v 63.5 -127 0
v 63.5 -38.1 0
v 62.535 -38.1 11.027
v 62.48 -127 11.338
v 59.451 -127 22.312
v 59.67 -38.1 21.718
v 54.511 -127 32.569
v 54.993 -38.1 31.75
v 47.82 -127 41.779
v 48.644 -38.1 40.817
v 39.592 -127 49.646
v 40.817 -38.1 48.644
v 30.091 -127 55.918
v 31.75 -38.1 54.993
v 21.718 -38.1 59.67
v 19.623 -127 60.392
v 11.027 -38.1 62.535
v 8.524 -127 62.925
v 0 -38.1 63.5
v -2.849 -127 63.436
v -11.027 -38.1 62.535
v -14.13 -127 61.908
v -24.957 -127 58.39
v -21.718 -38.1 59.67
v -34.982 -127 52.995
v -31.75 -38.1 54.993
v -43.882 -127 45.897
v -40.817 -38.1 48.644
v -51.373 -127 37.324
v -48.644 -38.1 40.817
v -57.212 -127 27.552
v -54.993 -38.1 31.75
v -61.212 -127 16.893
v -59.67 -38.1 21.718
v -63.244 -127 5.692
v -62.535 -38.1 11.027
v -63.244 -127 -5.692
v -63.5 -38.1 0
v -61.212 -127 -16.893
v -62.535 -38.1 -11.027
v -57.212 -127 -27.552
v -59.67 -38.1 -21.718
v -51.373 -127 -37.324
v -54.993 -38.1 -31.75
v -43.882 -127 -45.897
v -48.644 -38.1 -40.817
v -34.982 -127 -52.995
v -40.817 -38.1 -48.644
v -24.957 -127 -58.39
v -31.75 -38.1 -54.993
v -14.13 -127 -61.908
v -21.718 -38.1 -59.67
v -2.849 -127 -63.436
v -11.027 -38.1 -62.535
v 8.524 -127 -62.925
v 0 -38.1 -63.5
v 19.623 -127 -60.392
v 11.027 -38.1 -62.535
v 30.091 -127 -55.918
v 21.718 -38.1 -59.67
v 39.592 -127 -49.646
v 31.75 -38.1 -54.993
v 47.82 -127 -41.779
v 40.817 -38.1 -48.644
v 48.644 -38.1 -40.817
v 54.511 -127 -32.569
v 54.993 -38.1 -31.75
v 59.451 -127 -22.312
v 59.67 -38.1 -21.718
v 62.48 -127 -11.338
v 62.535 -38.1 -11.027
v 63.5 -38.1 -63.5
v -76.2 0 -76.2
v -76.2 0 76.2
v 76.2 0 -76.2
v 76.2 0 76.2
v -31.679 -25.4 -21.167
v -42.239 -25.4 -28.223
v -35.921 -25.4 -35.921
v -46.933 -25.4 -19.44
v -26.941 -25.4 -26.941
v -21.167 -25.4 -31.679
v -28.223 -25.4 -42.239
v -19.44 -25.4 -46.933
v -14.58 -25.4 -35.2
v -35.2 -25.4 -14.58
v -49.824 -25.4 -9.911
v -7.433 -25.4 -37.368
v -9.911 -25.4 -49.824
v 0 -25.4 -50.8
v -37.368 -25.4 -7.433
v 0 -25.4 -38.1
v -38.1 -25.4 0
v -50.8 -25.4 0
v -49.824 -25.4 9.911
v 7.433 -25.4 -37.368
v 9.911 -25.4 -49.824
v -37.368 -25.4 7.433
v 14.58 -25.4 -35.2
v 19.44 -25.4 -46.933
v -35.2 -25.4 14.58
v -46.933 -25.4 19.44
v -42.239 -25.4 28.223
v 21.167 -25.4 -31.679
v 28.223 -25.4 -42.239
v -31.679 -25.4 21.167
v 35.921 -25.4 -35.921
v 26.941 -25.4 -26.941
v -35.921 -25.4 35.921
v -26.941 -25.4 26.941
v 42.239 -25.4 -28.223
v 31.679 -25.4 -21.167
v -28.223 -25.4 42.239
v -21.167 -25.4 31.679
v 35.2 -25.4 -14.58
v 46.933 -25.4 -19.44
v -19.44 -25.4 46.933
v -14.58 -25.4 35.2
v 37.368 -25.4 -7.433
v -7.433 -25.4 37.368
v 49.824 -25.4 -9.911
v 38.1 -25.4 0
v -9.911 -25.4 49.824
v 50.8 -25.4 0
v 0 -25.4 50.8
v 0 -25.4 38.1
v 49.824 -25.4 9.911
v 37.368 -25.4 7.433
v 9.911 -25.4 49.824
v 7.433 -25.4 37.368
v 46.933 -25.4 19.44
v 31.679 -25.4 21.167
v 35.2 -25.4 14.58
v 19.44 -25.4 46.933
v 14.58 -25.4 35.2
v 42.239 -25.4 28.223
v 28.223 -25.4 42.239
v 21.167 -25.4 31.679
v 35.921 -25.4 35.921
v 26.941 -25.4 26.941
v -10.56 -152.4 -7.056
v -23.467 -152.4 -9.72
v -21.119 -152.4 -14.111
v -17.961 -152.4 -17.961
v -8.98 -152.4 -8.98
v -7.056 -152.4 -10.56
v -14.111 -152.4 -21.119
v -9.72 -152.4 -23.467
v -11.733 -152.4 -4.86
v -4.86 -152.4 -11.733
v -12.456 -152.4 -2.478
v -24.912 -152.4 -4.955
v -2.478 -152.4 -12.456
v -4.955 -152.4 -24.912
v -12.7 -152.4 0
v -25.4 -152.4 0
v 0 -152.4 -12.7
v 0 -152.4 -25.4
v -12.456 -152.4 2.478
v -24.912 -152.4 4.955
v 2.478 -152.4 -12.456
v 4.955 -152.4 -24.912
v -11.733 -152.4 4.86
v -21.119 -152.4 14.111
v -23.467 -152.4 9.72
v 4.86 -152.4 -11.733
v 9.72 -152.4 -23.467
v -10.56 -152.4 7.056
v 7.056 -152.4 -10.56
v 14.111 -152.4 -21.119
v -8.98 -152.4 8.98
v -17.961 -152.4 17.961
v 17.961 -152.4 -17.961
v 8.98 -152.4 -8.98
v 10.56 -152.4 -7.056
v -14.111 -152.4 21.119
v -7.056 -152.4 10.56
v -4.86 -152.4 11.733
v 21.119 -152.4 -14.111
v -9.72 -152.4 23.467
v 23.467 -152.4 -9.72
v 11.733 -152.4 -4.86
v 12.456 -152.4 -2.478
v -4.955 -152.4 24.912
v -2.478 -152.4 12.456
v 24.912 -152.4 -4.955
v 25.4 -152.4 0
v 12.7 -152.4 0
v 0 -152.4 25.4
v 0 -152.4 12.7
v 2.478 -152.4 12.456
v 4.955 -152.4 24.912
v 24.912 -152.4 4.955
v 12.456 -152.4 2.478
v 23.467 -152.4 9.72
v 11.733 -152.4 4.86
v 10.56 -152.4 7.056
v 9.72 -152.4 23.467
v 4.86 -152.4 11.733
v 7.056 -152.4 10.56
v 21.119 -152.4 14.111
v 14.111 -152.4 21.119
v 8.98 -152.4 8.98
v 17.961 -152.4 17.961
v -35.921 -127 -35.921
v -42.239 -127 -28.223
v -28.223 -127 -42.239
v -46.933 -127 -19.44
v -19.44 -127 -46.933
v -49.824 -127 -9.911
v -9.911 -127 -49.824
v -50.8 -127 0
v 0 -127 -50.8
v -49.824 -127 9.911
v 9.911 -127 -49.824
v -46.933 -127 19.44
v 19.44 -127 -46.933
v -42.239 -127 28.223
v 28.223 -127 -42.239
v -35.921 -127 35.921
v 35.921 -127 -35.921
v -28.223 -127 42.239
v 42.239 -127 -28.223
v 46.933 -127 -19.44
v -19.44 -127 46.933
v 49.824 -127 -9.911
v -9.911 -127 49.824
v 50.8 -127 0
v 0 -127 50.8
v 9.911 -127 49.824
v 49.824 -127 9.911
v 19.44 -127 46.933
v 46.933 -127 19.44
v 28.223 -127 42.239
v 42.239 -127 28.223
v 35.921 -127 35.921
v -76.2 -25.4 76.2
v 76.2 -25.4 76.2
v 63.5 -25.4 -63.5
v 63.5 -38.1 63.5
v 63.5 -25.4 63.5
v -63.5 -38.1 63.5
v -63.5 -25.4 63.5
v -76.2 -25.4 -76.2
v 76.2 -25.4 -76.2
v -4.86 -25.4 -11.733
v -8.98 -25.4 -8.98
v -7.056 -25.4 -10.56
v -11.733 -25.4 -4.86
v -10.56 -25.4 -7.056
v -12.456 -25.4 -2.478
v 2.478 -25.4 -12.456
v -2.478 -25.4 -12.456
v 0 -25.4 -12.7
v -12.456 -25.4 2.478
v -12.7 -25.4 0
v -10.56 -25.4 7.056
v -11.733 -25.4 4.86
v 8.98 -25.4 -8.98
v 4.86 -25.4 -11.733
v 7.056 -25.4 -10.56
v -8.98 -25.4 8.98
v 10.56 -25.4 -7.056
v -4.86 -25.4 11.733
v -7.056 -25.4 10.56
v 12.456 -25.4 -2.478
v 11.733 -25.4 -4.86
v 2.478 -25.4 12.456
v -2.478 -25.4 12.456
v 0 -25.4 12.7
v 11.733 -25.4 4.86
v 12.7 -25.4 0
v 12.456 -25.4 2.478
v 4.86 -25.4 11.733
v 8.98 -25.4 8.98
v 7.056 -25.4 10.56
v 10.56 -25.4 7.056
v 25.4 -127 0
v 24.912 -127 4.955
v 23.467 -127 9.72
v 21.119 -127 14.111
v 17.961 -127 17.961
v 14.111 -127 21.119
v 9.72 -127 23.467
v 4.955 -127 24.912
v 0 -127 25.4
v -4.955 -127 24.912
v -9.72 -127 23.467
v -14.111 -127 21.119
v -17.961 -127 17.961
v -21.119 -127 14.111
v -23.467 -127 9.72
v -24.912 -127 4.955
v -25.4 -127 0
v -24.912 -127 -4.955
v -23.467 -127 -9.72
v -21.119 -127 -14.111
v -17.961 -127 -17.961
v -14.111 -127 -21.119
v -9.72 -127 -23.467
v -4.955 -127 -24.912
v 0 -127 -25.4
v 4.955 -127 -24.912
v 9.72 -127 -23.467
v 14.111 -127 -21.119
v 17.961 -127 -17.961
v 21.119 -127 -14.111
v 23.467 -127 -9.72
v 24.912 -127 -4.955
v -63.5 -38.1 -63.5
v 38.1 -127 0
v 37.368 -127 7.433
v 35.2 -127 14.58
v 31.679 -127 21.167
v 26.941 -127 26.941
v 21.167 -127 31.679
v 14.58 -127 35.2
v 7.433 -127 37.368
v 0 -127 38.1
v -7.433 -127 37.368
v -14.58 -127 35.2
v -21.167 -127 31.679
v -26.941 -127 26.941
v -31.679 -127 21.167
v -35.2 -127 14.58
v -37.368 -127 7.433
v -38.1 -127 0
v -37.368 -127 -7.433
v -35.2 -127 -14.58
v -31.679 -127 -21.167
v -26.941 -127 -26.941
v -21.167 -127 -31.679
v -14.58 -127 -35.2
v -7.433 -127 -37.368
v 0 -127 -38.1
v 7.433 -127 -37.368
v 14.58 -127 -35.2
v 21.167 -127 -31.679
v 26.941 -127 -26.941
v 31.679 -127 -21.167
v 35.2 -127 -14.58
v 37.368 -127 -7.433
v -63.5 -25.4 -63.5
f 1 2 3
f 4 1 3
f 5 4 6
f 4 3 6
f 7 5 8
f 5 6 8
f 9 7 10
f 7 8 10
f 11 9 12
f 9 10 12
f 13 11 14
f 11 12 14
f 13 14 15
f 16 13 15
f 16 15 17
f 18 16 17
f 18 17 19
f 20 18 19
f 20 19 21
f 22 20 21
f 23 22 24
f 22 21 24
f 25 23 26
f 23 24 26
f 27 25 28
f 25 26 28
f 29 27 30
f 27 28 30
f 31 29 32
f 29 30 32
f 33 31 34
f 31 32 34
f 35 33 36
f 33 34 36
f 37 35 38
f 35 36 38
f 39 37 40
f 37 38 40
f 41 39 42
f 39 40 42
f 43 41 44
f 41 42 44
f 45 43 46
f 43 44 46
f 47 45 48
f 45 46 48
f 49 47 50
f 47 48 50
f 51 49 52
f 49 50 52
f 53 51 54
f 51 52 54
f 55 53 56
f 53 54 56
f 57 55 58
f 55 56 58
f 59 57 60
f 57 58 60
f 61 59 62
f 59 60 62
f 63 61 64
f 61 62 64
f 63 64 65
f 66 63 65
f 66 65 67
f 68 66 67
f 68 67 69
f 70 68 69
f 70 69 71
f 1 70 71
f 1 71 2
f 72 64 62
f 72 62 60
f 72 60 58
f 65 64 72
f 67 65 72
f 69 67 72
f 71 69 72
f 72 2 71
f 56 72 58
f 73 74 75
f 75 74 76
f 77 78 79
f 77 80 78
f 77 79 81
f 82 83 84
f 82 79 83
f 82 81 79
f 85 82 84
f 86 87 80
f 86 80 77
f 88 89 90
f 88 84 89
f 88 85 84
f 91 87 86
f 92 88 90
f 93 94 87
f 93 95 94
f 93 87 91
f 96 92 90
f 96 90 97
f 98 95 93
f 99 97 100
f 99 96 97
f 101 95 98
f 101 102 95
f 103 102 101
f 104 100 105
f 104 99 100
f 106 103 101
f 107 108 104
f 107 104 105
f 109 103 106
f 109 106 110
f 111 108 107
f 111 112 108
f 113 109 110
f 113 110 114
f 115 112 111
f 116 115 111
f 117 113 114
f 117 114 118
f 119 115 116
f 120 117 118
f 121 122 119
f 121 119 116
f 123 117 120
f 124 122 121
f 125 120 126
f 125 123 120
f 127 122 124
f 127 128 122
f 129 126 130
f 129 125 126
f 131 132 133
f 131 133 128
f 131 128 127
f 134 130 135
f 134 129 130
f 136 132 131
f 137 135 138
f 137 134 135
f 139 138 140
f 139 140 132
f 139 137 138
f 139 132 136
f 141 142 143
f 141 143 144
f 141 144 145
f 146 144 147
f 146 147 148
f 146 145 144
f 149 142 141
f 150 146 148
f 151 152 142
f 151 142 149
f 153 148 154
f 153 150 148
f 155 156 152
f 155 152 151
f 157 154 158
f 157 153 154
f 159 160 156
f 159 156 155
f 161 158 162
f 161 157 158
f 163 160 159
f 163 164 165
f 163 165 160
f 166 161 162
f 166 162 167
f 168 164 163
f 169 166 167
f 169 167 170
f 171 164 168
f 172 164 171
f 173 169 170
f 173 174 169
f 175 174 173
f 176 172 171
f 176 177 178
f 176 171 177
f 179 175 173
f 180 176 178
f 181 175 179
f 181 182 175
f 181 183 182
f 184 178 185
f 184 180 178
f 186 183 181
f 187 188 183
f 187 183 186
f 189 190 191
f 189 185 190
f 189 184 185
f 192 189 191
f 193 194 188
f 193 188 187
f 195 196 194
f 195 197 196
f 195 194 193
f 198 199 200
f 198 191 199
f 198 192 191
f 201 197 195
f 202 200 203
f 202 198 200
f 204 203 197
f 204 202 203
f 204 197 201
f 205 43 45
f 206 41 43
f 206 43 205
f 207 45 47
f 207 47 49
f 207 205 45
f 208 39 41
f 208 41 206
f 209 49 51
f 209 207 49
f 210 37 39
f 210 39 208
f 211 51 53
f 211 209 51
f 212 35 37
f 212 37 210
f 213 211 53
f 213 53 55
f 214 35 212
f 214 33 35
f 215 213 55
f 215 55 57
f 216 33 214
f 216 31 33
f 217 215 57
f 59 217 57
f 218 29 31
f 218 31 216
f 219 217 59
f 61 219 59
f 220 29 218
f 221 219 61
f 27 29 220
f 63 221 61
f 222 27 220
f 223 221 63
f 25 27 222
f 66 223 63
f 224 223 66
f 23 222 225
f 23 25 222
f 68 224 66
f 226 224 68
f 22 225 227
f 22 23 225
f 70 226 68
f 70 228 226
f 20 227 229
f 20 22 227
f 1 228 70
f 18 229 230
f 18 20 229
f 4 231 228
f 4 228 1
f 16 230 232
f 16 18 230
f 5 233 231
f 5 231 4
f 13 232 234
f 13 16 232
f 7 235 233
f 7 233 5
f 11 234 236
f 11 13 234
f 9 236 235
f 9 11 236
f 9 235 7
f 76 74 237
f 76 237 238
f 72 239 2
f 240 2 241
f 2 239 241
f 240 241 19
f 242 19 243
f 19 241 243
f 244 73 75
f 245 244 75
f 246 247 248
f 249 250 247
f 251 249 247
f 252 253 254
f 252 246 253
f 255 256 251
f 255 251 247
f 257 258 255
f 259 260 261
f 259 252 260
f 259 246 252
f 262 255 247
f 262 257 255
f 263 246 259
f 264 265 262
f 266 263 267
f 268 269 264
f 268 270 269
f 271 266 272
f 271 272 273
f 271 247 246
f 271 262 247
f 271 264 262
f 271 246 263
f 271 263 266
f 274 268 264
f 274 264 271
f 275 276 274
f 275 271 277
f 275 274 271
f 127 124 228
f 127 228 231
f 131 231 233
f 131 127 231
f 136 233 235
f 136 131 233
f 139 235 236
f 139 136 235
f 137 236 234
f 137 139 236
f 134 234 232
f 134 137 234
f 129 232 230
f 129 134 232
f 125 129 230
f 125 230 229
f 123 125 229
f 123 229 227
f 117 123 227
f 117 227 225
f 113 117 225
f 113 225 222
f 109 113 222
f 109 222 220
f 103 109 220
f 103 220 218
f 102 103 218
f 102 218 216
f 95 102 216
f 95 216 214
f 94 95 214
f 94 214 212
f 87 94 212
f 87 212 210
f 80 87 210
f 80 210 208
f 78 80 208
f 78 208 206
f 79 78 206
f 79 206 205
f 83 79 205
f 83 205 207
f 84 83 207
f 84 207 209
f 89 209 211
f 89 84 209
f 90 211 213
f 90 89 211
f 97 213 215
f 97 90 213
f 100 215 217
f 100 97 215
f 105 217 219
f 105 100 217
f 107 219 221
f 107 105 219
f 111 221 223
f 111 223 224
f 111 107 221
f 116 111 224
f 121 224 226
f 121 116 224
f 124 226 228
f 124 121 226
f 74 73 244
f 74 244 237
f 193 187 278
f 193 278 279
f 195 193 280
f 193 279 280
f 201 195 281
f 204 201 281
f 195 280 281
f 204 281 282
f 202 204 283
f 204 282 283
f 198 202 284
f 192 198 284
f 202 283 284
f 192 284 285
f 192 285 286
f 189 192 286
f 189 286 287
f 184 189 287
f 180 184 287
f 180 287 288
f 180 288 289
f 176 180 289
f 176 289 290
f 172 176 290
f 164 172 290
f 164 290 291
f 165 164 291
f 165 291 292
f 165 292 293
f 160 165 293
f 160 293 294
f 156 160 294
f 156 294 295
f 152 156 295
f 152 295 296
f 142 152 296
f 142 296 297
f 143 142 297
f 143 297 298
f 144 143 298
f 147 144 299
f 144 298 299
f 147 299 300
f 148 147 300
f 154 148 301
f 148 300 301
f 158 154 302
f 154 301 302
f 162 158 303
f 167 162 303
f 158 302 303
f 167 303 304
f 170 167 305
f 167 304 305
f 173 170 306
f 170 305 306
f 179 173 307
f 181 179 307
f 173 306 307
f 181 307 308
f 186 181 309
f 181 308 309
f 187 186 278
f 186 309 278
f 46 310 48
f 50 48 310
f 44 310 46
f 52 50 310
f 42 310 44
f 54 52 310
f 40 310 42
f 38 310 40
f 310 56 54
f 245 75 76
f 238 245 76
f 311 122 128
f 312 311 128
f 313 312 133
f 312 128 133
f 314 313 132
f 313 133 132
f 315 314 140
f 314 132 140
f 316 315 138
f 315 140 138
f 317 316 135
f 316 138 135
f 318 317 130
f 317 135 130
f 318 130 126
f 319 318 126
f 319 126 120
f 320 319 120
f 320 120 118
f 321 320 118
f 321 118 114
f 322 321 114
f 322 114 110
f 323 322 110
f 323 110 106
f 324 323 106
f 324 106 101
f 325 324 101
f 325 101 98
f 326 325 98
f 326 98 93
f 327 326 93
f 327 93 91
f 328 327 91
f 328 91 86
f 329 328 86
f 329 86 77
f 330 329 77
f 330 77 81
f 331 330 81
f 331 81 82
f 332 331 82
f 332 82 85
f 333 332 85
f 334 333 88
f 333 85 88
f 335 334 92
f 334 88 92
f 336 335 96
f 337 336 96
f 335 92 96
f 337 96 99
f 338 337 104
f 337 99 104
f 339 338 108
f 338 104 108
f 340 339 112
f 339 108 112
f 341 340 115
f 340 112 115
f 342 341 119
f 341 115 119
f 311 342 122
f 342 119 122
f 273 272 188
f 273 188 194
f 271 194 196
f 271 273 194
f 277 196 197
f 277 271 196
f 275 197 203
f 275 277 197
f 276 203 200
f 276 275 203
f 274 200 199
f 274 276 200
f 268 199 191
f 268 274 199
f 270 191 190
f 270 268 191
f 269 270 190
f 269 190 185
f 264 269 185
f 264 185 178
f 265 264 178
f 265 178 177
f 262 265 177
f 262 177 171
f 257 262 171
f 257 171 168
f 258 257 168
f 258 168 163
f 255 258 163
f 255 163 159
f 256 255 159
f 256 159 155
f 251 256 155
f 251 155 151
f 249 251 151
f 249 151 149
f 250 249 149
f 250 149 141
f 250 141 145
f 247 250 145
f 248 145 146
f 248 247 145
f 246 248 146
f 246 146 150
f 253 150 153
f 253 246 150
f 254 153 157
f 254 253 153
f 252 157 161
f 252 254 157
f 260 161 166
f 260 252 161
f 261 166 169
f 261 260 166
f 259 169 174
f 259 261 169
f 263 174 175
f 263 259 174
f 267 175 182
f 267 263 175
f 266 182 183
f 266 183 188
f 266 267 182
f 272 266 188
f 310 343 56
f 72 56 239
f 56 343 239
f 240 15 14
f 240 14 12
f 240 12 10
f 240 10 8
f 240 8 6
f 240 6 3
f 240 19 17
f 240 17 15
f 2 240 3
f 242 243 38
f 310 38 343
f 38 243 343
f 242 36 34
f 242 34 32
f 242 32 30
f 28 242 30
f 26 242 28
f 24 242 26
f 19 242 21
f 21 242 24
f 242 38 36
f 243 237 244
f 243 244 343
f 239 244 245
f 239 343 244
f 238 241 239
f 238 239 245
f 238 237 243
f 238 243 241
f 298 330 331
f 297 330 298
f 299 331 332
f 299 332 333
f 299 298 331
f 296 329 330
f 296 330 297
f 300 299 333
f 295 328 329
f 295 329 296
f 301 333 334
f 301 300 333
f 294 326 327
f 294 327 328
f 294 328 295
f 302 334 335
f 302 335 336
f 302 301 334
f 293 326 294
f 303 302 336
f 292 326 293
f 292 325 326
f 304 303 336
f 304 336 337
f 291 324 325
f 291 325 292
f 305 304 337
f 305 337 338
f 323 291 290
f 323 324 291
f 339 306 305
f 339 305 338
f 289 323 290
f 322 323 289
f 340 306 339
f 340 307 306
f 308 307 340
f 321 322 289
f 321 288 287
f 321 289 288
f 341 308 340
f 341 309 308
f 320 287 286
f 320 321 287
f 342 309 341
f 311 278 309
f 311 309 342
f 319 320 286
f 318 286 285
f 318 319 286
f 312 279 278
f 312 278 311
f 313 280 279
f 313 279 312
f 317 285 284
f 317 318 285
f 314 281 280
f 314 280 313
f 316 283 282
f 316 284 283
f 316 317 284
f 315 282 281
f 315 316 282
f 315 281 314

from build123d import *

# Parameters (mm, degrees)
F0_R      = 63.5
F0_R_2    = 38.1
F1_DEPTH  = 12.7
F2_R      = 38.1
F2_R_2    = 25.4
F3_DEPTH  = 127
F4_R      = 25.4
F4_R_2    = 12.7
F5_DEPTH  = 152.4
F6_R      = 63.5
F6_R_2    = 50.8
F7_DEPTH  = 127
F8_W      = 152.4
F8_H      = 152.4
F9_DEPTH  = 25.4
F11_DEPTH = 12.7


with BuildPart() as f1:
    # F0 (on Front) → F1 (new body)
    with BuildSketch(Plane.XZ):
        Circle(F0_R)
        Circle(F0_R_2, mode=Mode.SUBTRACT)
    extrude(amount=F1_DEPTH)

    # F2 (on Front) → F3 (join)
    with BuildSketch(Plane.XZ):
        Circle(F2_R)
        Circle(F2_R_2, mode=Mode.SUBTRACT)
    extrude(amount=F3_DEPTH)

    # F4 (on Front) → F5 (join)
    with BuildSketch(Plane.XZ):
        Circle(F4_R)
        Circle(F4_R_2, mode=Mode.SUBTRACT)
    extrude(amount=F5_DEPTH)

    # F6 (on Front) → F7 (join)
    with BuildSketch(Plane.XZ):
        Circle(F6_R)
        Circle(F6_R_2, mode=Mode.SUBTRACT)
    extrude(amount=F7_DEPTH)

    # F8 (on Front) → F9 (join)
    with BuildSketch(Plane.XZ):
        Rectangle(F8_W, F8_H)
    extrude(amount=F9_DEPTH)

    # F10 (on face) → F11 (join)
    with BuildSketch(Plane.XZ.offset(25.4)):
        with BuildLine():
            Line((1.088e-07, 63.5), (-63.5, 63.5))
            Line((-63.5, 63.5), (-63.5, 0))
            ThreePointArc((-63.5, 0), (-44.9012805669, 44.9012806438), (1.088e-07, 63.5))
        make_face()
        with BuildLine():
            ThreePointArc((-4.16e-08, -63.5), (-44.90128062, -44.9012805906), (-63.5, 0))
            Line((-63.5, 0), (-63.5, -63.5))
            Line((-63.5, -63.5), (-4.16e-08, -63.5))
        make_face()
        with BuildLine():
            Line((63.5, 63.5), (1.088e-07, 63.5))
            ThreePointArc((1.088e-07, 63.5), (44.9012806438, 44.9012805669), (63.5, 0))
            Line((63.5, 0), (63.5, 63.5))
        make_face()
        with BuildLine():
            Line((63.5, -63.5), (63.5, 0))
            ThreePointArc((63.5, 0), (44.9012805906, -44.90128062), (-4.16e-08, -63.5))
            Line((-4.16e-08, -63.5), (63.5, -63.5))
        make_face()
    extrude(amount=F11_DEPTH)


solid = f1.part
